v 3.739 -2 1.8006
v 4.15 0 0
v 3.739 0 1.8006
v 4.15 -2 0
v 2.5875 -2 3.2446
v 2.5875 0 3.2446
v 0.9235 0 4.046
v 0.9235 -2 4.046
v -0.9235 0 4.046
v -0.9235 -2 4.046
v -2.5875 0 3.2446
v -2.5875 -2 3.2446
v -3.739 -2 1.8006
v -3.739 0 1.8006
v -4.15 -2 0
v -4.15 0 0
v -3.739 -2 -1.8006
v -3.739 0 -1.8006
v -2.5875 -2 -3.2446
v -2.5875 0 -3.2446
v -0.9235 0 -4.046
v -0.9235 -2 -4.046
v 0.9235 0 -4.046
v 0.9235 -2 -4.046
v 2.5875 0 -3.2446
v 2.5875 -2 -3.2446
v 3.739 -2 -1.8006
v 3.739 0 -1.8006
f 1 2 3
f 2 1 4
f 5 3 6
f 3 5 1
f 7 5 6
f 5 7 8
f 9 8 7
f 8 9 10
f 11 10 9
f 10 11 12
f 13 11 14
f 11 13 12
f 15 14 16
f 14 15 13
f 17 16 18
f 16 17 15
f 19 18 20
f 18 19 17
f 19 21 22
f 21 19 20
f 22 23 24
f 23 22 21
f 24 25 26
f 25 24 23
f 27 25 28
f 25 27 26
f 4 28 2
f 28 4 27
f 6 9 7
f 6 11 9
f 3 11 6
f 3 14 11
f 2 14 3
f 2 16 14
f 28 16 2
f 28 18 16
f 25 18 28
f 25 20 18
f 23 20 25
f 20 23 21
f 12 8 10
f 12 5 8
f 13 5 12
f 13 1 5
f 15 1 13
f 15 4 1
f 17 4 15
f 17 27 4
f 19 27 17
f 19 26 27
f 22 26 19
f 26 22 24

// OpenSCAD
// file: power-socket.scad
// origin is center of outward-facing hole face
module power_socket_hole(diameter, thickness) {
    rotate(a=90, v=[1, 0, 0]) {
        cylinder(d=diameter, h=thickness);
    }
}
// main file
use <power-socket.scad>

// measured outside the threads
socket_diameter=7.8;
// wall thickness
thickness = 2;

// add tolerance
diameter=socket_diameter+0.5;

power_socket_hole(
    diameter=diameter,
    thickness=thickness
);
